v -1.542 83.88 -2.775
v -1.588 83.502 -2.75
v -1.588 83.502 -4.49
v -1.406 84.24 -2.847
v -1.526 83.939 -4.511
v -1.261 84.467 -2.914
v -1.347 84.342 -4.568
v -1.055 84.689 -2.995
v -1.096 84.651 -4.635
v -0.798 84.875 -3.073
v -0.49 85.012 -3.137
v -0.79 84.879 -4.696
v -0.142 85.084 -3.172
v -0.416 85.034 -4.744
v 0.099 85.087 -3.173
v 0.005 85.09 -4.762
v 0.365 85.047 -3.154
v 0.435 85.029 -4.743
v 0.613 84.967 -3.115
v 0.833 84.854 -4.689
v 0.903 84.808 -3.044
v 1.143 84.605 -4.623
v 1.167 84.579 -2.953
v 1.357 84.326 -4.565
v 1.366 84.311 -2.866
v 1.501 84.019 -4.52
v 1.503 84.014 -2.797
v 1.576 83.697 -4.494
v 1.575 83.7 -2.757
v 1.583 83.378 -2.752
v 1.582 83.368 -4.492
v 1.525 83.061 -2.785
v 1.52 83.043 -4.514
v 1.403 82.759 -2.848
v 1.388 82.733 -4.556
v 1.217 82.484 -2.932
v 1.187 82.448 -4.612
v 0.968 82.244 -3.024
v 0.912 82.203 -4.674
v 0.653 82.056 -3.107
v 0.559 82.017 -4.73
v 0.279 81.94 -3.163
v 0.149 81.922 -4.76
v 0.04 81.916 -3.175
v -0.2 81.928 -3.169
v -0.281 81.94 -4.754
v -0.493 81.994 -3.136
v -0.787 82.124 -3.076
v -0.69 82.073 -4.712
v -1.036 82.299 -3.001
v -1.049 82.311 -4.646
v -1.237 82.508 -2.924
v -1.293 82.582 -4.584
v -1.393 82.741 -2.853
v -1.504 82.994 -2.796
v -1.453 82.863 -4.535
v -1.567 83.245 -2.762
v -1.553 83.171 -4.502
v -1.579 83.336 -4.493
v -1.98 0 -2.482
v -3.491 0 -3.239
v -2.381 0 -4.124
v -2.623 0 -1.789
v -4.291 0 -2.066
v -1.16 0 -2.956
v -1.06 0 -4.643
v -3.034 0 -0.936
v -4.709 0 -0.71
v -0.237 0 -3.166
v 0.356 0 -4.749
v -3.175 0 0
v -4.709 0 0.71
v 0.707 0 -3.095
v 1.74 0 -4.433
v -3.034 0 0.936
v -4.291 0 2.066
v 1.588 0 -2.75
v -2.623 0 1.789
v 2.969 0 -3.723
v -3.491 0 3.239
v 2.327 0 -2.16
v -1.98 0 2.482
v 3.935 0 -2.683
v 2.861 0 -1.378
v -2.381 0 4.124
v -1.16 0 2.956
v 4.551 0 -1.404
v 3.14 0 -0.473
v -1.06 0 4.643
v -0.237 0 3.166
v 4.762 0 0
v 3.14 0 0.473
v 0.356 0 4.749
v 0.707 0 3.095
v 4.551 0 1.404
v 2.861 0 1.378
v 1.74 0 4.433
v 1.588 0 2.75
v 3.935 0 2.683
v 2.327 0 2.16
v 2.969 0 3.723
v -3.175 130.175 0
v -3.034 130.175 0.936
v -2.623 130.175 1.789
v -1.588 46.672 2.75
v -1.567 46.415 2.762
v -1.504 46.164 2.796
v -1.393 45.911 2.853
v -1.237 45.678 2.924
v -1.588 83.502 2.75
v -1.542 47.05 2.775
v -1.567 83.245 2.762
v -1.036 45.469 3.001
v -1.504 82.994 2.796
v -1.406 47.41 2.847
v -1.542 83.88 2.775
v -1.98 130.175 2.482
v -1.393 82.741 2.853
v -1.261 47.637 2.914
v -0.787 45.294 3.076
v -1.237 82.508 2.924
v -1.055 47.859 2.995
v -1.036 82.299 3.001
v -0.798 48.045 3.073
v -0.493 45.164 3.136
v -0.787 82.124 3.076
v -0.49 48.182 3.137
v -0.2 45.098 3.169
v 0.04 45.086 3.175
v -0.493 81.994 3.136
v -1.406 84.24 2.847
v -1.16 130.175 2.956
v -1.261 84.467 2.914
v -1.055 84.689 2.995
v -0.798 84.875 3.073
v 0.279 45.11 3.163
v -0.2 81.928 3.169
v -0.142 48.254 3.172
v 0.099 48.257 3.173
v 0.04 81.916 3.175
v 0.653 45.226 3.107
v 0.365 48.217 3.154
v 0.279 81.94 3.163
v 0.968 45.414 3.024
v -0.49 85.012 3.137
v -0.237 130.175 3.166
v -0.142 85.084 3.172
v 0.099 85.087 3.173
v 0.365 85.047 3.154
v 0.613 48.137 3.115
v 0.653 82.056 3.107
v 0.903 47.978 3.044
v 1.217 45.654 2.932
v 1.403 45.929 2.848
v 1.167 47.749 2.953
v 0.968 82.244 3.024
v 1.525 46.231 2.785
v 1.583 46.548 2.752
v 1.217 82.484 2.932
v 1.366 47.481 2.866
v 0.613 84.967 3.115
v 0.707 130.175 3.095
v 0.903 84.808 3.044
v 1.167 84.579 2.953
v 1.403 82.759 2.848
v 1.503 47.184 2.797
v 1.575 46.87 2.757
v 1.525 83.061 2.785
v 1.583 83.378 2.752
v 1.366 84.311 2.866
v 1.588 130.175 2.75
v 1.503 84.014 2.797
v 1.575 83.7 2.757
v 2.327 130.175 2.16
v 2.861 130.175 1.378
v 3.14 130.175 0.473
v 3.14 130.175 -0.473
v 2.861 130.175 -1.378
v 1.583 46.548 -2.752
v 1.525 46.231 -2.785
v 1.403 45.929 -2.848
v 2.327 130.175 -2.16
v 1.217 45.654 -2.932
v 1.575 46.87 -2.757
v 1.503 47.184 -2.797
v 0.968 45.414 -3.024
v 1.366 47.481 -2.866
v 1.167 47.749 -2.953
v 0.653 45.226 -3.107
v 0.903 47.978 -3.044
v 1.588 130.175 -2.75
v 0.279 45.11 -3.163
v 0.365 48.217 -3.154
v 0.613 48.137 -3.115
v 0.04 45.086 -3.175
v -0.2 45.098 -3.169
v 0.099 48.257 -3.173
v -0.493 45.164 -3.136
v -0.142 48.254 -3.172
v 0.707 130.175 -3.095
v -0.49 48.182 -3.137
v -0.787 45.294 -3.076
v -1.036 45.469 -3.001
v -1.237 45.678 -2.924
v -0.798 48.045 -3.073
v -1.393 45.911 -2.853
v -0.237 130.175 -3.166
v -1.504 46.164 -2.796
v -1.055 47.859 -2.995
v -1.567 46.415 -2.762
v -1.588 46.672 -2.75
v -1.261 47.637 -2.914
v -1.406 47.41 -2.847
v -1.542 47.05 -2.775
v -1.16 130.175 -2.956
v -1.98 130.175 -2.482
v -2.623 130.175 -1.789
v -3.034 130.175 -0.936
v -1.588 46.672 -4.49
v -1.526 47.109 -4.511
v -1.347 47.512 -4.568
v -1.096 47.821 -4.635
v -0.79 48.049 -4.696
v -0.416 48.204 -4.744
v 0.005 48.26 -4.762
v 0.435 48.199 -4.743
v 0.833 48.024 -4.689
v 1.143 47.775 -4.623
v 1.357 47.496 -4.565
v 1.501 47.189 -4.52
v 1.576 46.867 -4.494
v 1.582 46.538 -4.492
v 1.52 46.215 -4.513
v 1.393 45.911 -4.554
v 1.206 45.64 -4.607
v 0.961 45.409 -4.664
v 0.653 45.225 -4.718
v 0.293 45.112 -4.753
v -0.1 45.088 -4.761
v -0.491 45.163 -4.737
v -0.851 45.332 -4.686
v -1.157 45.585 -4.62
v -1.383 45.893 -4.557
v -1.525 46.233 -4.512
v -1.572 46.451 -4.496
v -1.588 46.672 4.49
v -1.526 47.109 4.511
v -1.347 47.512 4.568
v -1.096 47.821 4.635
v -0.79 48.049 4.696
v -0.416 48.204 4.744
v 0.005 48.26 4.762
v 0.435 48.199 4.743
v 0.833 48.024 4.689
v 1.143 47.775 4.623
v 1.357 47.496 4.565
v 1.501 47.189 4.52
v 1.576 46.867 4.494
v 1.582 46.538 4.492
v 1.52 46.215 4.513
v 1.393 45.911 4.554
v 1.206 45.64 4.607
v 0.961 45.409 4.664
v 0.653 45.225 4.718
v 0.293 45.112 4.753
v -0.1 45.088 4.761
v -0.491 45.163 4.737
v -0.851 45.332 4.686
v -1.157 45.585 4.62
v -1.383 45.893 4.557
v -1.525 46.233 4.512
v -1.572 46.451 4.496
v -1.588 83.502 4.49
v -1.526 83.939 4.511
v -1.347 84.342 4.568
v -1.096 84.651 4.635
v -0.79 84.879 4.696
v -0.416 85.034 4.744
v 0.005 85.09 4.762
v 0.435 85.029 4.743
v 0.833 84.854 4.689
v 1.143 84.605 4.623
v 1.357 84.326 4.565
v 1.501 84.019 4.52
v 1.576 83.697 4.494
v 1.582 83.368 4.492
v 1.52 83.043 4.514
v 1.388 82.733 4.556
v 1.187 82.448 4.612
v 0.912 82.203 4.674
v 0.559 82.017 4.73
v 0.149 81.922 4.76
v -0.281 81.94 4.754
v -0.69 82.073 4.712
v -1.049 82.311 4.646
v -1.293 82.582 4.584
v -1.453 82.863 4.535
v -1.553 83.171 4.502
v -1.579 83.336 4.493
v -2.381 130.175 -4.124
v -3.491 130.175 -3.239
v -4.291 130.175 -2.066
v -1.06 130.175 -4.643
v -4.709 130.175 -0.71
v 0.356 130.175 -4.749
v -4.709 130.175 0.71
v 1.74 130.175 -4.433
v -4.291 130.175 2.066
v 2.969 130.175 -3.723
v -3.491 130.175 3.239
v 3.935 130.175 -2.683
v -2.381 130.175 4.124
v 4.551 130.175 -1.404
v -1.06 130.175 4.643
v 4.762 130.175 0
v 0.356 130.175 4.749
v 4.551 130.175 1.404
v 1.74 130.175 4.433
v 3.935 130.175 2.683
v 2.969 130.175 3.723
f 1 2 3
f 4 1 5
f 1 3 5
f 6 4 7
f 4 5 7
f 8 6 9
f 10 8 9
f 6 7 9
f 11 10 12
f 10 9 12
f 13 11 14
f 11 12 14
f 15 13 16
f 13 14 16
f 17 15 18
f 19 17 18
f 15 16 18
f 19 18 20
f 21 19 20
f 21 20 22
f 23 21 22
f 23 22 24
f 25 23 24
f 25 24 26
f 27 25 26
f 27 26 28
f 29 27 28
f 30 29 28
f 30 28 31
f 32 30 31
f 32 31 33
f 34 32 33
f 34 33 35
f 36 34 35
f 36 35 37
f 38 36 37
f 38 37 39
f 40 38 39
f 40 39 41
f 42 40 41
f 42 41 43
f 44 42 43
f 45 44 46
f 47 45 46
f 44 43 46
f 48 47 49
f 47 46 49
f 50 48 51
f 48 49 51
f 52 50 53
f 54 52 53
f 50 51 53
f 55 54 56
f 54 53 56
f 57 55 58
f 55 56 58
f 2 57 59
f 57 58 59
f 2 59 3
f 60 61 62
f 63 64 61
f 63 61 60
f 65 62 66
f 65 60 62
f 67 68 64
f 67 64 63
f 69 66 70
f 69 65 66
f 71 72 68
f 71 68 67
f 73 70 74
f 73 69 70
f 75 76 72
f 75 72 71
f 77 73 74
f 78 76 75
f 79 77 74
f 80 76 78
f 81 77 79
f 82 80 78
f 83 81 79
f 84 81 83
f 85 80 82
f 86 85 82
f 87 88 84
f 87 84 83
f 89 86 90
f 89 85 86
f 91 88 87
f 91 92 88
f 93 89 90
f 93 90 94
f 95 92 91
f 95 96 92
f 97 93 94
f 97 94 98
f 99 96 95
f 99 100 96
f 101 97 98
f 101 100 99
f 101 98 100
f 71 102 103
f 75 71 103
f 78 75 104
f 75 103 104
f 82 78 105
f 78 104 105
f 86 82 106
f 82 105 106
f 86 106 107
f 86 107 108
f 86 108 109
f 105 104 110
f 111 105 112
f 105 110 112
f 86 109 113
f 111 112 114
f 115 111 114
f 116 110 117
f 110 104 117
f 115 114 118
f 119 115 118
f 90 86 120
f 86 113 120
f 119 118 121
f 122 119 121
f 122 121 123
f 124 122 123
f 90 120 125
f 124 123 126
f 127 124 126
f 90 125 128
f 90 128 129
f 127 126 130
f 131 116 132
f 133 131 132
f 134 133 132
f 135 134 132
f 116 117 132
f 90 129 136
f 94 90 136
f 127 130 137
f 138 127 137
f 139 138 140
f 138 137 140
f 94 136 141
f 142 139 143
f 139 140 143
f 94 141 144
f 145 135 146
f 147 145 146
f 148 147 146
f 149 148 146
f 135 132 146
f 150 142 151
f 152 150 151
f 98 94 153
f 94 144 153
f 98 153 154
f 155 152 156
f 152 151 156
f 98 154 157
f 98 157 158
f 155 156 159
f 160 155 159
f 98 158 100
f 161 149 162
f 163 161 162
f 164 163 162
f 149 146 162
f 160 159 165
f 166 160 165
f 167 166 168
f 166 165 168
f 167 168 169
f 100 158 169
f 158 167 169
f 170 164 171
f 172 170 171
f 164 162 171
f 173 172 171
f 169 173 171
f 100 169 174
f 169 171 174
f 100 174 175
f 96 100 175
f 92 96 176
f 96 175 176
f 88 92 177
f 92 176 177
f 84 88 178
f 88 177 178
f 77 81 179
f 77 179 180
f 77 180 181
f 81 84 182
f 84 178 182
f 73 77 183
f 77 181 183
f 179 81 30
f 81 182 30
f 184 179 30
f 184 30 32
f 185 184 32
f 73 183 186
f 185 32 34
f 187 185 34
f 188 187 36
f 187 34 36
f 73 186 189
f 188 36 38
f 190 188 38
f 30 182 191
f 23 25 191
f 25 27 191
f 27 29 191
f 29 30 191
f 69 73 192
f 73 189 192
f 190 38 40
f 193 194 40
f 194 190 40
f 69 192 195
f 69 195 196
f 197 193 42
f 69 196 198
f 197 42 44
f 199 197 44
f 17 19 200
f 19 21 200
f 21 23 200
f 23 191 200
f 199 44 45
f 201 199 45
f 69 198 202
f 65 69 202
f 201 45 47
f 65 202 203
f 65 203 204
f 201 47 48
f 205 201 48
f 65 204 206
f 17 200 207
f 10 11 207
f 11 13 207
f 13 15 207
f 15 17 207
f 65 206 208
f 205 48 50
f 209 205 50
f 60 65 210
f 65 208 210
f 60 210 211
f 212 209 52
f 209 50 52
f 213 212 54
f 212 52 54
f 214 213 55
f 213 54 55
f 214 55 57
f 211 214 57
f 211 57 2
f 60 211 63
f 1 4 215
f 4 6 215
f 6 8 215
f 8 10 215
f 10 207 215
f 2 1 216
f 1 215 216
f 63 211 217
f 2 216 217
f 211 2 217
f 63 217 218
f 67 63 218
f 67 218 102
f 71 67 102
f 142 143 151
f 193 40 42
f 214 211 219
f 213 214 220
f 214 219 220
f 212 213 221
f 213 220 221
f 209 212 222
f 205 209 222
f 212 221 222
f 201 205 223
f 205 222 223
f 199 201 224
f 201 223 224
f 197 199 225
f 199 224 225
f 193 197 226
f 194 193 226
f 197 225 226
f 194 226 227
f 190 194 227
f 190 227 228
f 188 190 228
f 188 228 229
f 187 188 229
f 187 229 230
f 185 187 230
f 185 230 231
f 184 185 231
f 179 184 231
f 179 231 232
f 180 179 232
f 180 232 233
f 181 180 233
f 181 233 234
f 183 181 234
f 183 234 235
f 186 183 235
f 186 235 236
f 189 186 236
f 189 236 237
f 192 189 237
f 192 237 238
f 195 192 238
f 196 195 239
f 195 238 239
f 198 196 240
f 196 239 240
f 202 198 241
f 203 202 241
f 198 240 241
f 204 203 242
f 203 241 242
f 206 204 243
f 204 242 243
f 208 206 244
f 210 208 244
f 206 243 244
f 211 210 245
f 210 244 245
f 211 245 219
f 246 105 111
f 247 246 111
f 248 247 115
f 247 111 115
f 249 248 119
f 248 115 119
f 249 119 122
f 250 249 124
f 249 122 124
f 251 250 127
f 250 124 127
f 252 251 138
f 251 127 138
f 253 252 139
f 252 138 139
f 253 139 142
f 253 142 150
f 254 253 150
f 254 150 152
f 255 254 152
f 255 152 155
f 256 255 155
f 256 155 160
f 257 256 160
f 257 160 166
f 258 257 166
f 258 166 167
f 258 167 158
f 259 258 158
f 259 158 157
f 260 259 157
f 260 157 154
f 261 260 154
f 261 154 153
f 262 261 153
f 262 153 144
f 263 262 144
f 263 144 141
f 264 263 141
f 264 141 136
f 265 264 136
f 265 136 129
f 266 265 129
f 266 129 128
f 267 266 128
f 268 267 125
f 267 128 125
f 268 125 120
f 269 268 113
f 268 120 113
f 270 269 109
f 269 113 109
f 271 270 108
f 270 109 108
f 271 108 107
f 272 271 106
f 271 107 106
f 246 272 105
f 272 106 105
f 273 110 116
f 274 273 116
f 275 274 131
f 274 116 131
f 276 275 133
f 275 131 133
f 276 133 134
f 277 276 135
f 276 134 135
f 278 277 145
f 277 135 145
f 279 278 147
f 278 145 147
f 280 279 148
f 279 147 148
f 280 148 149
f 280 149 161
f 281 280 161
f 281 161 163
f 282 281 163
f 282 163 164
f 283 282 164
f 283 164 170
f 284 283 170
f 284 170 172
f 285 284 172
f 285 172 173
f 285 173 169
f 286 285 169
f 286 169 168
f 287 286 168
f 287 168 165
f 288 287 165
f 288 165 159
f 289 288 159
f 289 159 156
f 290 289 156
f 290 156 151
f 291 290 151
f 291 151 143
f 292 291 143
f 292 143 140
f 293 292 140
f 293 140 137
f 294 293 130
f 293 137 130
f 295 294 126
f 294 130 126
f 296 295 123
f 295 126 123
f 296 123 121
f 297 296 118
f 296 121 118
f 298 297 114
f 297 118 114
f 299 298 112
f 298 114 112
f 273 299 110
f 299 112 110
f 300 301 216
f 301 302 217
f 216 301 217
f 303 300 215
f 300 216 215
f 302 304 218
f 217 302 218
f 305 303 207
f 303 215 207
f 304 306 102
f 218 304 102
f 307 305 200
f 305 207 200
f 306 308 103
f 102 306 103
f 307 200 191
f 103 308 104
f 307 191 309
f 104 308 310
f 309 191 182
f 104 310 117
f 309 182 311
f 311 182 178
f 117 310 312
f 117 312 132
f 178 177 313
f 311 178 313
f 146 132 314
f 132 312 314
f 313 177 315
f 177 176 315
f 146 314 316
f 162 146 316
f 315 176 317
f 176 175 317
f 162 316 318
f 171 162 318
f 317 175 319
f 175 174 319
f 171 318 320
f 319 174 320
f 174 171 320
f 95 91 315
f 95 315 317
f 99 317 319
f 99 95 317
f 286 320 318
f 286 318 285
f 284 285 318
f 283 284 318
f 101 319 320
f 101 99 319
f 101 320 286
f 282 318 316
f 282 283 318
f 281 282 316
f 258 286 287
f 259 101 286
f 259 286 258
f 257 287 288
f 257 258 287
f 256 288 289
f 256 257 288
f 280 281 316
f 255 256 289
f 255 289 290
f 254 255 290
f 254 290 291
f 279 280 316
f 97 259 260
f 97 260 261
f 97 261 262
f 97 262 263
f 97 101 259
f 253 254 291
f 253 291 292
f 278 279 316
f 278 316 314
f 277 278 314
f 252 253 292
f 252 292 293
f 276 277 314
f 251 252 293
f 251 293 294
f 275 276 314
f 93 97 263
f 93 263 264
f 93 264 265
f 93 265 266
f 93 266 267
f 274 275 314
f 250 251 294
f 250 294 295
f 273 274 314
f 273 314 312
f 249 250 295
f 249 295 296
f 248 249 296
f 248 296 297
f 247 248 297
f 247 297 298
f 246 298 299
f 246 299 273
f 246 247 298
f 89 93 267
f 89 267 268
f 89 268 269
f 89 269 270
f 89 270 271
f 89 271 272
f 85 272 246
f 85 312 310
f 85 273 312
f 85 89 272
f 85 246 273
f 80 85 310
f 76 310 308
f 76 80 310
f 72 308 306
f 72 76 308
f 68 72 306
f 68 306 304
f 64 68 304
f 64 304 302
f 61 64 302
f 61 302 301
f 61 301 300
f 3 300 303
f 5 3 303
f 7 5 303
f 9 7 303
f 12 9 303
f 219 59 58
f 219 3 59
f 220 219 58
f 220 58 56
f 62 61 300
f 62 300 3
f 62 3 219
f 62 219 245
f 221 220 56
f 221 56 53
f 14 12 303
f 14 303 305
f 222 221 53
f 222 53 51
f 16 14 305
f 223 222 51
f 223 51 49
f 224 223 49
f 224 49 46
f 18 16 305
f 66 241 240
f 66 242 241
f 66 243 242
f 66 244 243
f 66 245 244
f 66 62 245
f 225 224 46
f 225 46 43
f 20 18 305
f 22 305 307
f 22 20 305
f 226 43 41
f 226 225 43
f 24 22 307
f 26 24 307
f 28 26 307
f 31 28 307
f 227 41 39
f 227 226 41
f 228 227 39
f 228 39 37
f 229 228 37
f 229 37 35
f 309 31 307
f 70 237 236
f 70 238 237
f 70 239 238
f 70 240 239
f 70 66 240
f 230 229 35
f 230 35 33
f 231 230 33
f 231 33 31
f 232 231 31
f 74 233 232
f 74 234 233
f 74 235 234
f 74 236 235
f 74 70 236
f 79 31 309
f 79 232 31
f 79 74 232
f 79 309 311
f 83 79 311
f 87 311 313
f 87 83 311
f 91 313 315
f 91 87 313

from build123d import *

# Parameters (mm, degrees)
F0_R        = 4.7625
F1_DEPTH    = 130.175
F3_D        = 6.35
F4_W        = 9.525
F4_H        = 9.525
F5_DEPTH    = 130.175
F7_D        = 3.175
F8_T1_DEPTH = 155.575
F11_D       = 3.175


# Not quite as in the source:
# - a fillet or chamfer that OpenCascade refuses, or shapes differently, is made with other operations: its cross-section is extruded or revolved along the edge and cut away or added


with BuildPart() as f1:
    # F0 (on Front) → F1 (new body)
    with BuildSketch(Plane.XZ):
        Circle(F0_R)
    extrude(amount=-F1_DEPTH)

    # F3 (through all)
    with Locations(Plane.XZ):
        with Locations((0, 0)):
            Hole(F3_D / 2)

    # F11 (through all)
    with Locations(Plane.XY.offset(6.604)):
        with Locations((0, 83.5025), (0, 46.6725)):
            Hole(F11_D / 2)


with BuildPart() as f5:
    # F4 (on Front) → F5 (new body)
    with BuildSketch(Plane.XZ):
        with Locations((196.4227657549, 4.7625)):
            Rectangle(F4_W, F4_H)
    extrude(amount=-F5_DEPTH)

    # F7 (through all)
    with Locations(Plane.XY.offset(9.525)):
        with Locations((196.4227657549, 83.5025), (196.4227657549, 46.6725)):
            Hole(F7_D / 2)

    # F8: fillet of radius 5.08 on 4 edges, made by hand

    # F8_s2 → F8_t1 (cut)
    with BuildSketch(Plane.XZ.offset(-142.875)):
        with BuildLine():
            ThreePointArc((196.1052657549, 9.525), (199.6973682033, 8.0371024484), (201.1852657549, 4.445))
            Line((201.1852657549, 4.445), (201.1852657549, 9.525))
            Line((201.1852657549, 9.525), (196.1052657549, 9.525))
        make_face()
        with BuildLine():
            ThreePointArc((191.6602657549, 4.445), (193.1481633065, 8.0371024484), (196.7402657549, 9.525))
            Line((196.7402657549, 9.525), (191.6602657549, 9.525))
            Line((191.6602657549, 9.525), (191.6602657549, 4.445))
        make_face()
        with BuildLine():
            ThreePointArc((196.1052657549, 0), (199.6973682033, 1.4878975516), (201.1852657549, 5.08))
            Line((201.1852657549, 5.08), (201.1852657549, 0))
            Line((201.1852657549, 0), (196.1052657549, 0))
        make_face()
        with BuildLine():
            ThreePointArc((191.6602657549, 5.08), (193.1481633065, 1.4878975516), (196.7402657549, 0))
            Line((196.7402657549, 0), (191.6602657549, 0))
            Line((191.6602657549, 0), (191.6602657549, 5.08))
        make_face()
    extrude(amount=F8_T1_DEPTH, mode=Mode.SUBTRACT)


solid = f1.part
